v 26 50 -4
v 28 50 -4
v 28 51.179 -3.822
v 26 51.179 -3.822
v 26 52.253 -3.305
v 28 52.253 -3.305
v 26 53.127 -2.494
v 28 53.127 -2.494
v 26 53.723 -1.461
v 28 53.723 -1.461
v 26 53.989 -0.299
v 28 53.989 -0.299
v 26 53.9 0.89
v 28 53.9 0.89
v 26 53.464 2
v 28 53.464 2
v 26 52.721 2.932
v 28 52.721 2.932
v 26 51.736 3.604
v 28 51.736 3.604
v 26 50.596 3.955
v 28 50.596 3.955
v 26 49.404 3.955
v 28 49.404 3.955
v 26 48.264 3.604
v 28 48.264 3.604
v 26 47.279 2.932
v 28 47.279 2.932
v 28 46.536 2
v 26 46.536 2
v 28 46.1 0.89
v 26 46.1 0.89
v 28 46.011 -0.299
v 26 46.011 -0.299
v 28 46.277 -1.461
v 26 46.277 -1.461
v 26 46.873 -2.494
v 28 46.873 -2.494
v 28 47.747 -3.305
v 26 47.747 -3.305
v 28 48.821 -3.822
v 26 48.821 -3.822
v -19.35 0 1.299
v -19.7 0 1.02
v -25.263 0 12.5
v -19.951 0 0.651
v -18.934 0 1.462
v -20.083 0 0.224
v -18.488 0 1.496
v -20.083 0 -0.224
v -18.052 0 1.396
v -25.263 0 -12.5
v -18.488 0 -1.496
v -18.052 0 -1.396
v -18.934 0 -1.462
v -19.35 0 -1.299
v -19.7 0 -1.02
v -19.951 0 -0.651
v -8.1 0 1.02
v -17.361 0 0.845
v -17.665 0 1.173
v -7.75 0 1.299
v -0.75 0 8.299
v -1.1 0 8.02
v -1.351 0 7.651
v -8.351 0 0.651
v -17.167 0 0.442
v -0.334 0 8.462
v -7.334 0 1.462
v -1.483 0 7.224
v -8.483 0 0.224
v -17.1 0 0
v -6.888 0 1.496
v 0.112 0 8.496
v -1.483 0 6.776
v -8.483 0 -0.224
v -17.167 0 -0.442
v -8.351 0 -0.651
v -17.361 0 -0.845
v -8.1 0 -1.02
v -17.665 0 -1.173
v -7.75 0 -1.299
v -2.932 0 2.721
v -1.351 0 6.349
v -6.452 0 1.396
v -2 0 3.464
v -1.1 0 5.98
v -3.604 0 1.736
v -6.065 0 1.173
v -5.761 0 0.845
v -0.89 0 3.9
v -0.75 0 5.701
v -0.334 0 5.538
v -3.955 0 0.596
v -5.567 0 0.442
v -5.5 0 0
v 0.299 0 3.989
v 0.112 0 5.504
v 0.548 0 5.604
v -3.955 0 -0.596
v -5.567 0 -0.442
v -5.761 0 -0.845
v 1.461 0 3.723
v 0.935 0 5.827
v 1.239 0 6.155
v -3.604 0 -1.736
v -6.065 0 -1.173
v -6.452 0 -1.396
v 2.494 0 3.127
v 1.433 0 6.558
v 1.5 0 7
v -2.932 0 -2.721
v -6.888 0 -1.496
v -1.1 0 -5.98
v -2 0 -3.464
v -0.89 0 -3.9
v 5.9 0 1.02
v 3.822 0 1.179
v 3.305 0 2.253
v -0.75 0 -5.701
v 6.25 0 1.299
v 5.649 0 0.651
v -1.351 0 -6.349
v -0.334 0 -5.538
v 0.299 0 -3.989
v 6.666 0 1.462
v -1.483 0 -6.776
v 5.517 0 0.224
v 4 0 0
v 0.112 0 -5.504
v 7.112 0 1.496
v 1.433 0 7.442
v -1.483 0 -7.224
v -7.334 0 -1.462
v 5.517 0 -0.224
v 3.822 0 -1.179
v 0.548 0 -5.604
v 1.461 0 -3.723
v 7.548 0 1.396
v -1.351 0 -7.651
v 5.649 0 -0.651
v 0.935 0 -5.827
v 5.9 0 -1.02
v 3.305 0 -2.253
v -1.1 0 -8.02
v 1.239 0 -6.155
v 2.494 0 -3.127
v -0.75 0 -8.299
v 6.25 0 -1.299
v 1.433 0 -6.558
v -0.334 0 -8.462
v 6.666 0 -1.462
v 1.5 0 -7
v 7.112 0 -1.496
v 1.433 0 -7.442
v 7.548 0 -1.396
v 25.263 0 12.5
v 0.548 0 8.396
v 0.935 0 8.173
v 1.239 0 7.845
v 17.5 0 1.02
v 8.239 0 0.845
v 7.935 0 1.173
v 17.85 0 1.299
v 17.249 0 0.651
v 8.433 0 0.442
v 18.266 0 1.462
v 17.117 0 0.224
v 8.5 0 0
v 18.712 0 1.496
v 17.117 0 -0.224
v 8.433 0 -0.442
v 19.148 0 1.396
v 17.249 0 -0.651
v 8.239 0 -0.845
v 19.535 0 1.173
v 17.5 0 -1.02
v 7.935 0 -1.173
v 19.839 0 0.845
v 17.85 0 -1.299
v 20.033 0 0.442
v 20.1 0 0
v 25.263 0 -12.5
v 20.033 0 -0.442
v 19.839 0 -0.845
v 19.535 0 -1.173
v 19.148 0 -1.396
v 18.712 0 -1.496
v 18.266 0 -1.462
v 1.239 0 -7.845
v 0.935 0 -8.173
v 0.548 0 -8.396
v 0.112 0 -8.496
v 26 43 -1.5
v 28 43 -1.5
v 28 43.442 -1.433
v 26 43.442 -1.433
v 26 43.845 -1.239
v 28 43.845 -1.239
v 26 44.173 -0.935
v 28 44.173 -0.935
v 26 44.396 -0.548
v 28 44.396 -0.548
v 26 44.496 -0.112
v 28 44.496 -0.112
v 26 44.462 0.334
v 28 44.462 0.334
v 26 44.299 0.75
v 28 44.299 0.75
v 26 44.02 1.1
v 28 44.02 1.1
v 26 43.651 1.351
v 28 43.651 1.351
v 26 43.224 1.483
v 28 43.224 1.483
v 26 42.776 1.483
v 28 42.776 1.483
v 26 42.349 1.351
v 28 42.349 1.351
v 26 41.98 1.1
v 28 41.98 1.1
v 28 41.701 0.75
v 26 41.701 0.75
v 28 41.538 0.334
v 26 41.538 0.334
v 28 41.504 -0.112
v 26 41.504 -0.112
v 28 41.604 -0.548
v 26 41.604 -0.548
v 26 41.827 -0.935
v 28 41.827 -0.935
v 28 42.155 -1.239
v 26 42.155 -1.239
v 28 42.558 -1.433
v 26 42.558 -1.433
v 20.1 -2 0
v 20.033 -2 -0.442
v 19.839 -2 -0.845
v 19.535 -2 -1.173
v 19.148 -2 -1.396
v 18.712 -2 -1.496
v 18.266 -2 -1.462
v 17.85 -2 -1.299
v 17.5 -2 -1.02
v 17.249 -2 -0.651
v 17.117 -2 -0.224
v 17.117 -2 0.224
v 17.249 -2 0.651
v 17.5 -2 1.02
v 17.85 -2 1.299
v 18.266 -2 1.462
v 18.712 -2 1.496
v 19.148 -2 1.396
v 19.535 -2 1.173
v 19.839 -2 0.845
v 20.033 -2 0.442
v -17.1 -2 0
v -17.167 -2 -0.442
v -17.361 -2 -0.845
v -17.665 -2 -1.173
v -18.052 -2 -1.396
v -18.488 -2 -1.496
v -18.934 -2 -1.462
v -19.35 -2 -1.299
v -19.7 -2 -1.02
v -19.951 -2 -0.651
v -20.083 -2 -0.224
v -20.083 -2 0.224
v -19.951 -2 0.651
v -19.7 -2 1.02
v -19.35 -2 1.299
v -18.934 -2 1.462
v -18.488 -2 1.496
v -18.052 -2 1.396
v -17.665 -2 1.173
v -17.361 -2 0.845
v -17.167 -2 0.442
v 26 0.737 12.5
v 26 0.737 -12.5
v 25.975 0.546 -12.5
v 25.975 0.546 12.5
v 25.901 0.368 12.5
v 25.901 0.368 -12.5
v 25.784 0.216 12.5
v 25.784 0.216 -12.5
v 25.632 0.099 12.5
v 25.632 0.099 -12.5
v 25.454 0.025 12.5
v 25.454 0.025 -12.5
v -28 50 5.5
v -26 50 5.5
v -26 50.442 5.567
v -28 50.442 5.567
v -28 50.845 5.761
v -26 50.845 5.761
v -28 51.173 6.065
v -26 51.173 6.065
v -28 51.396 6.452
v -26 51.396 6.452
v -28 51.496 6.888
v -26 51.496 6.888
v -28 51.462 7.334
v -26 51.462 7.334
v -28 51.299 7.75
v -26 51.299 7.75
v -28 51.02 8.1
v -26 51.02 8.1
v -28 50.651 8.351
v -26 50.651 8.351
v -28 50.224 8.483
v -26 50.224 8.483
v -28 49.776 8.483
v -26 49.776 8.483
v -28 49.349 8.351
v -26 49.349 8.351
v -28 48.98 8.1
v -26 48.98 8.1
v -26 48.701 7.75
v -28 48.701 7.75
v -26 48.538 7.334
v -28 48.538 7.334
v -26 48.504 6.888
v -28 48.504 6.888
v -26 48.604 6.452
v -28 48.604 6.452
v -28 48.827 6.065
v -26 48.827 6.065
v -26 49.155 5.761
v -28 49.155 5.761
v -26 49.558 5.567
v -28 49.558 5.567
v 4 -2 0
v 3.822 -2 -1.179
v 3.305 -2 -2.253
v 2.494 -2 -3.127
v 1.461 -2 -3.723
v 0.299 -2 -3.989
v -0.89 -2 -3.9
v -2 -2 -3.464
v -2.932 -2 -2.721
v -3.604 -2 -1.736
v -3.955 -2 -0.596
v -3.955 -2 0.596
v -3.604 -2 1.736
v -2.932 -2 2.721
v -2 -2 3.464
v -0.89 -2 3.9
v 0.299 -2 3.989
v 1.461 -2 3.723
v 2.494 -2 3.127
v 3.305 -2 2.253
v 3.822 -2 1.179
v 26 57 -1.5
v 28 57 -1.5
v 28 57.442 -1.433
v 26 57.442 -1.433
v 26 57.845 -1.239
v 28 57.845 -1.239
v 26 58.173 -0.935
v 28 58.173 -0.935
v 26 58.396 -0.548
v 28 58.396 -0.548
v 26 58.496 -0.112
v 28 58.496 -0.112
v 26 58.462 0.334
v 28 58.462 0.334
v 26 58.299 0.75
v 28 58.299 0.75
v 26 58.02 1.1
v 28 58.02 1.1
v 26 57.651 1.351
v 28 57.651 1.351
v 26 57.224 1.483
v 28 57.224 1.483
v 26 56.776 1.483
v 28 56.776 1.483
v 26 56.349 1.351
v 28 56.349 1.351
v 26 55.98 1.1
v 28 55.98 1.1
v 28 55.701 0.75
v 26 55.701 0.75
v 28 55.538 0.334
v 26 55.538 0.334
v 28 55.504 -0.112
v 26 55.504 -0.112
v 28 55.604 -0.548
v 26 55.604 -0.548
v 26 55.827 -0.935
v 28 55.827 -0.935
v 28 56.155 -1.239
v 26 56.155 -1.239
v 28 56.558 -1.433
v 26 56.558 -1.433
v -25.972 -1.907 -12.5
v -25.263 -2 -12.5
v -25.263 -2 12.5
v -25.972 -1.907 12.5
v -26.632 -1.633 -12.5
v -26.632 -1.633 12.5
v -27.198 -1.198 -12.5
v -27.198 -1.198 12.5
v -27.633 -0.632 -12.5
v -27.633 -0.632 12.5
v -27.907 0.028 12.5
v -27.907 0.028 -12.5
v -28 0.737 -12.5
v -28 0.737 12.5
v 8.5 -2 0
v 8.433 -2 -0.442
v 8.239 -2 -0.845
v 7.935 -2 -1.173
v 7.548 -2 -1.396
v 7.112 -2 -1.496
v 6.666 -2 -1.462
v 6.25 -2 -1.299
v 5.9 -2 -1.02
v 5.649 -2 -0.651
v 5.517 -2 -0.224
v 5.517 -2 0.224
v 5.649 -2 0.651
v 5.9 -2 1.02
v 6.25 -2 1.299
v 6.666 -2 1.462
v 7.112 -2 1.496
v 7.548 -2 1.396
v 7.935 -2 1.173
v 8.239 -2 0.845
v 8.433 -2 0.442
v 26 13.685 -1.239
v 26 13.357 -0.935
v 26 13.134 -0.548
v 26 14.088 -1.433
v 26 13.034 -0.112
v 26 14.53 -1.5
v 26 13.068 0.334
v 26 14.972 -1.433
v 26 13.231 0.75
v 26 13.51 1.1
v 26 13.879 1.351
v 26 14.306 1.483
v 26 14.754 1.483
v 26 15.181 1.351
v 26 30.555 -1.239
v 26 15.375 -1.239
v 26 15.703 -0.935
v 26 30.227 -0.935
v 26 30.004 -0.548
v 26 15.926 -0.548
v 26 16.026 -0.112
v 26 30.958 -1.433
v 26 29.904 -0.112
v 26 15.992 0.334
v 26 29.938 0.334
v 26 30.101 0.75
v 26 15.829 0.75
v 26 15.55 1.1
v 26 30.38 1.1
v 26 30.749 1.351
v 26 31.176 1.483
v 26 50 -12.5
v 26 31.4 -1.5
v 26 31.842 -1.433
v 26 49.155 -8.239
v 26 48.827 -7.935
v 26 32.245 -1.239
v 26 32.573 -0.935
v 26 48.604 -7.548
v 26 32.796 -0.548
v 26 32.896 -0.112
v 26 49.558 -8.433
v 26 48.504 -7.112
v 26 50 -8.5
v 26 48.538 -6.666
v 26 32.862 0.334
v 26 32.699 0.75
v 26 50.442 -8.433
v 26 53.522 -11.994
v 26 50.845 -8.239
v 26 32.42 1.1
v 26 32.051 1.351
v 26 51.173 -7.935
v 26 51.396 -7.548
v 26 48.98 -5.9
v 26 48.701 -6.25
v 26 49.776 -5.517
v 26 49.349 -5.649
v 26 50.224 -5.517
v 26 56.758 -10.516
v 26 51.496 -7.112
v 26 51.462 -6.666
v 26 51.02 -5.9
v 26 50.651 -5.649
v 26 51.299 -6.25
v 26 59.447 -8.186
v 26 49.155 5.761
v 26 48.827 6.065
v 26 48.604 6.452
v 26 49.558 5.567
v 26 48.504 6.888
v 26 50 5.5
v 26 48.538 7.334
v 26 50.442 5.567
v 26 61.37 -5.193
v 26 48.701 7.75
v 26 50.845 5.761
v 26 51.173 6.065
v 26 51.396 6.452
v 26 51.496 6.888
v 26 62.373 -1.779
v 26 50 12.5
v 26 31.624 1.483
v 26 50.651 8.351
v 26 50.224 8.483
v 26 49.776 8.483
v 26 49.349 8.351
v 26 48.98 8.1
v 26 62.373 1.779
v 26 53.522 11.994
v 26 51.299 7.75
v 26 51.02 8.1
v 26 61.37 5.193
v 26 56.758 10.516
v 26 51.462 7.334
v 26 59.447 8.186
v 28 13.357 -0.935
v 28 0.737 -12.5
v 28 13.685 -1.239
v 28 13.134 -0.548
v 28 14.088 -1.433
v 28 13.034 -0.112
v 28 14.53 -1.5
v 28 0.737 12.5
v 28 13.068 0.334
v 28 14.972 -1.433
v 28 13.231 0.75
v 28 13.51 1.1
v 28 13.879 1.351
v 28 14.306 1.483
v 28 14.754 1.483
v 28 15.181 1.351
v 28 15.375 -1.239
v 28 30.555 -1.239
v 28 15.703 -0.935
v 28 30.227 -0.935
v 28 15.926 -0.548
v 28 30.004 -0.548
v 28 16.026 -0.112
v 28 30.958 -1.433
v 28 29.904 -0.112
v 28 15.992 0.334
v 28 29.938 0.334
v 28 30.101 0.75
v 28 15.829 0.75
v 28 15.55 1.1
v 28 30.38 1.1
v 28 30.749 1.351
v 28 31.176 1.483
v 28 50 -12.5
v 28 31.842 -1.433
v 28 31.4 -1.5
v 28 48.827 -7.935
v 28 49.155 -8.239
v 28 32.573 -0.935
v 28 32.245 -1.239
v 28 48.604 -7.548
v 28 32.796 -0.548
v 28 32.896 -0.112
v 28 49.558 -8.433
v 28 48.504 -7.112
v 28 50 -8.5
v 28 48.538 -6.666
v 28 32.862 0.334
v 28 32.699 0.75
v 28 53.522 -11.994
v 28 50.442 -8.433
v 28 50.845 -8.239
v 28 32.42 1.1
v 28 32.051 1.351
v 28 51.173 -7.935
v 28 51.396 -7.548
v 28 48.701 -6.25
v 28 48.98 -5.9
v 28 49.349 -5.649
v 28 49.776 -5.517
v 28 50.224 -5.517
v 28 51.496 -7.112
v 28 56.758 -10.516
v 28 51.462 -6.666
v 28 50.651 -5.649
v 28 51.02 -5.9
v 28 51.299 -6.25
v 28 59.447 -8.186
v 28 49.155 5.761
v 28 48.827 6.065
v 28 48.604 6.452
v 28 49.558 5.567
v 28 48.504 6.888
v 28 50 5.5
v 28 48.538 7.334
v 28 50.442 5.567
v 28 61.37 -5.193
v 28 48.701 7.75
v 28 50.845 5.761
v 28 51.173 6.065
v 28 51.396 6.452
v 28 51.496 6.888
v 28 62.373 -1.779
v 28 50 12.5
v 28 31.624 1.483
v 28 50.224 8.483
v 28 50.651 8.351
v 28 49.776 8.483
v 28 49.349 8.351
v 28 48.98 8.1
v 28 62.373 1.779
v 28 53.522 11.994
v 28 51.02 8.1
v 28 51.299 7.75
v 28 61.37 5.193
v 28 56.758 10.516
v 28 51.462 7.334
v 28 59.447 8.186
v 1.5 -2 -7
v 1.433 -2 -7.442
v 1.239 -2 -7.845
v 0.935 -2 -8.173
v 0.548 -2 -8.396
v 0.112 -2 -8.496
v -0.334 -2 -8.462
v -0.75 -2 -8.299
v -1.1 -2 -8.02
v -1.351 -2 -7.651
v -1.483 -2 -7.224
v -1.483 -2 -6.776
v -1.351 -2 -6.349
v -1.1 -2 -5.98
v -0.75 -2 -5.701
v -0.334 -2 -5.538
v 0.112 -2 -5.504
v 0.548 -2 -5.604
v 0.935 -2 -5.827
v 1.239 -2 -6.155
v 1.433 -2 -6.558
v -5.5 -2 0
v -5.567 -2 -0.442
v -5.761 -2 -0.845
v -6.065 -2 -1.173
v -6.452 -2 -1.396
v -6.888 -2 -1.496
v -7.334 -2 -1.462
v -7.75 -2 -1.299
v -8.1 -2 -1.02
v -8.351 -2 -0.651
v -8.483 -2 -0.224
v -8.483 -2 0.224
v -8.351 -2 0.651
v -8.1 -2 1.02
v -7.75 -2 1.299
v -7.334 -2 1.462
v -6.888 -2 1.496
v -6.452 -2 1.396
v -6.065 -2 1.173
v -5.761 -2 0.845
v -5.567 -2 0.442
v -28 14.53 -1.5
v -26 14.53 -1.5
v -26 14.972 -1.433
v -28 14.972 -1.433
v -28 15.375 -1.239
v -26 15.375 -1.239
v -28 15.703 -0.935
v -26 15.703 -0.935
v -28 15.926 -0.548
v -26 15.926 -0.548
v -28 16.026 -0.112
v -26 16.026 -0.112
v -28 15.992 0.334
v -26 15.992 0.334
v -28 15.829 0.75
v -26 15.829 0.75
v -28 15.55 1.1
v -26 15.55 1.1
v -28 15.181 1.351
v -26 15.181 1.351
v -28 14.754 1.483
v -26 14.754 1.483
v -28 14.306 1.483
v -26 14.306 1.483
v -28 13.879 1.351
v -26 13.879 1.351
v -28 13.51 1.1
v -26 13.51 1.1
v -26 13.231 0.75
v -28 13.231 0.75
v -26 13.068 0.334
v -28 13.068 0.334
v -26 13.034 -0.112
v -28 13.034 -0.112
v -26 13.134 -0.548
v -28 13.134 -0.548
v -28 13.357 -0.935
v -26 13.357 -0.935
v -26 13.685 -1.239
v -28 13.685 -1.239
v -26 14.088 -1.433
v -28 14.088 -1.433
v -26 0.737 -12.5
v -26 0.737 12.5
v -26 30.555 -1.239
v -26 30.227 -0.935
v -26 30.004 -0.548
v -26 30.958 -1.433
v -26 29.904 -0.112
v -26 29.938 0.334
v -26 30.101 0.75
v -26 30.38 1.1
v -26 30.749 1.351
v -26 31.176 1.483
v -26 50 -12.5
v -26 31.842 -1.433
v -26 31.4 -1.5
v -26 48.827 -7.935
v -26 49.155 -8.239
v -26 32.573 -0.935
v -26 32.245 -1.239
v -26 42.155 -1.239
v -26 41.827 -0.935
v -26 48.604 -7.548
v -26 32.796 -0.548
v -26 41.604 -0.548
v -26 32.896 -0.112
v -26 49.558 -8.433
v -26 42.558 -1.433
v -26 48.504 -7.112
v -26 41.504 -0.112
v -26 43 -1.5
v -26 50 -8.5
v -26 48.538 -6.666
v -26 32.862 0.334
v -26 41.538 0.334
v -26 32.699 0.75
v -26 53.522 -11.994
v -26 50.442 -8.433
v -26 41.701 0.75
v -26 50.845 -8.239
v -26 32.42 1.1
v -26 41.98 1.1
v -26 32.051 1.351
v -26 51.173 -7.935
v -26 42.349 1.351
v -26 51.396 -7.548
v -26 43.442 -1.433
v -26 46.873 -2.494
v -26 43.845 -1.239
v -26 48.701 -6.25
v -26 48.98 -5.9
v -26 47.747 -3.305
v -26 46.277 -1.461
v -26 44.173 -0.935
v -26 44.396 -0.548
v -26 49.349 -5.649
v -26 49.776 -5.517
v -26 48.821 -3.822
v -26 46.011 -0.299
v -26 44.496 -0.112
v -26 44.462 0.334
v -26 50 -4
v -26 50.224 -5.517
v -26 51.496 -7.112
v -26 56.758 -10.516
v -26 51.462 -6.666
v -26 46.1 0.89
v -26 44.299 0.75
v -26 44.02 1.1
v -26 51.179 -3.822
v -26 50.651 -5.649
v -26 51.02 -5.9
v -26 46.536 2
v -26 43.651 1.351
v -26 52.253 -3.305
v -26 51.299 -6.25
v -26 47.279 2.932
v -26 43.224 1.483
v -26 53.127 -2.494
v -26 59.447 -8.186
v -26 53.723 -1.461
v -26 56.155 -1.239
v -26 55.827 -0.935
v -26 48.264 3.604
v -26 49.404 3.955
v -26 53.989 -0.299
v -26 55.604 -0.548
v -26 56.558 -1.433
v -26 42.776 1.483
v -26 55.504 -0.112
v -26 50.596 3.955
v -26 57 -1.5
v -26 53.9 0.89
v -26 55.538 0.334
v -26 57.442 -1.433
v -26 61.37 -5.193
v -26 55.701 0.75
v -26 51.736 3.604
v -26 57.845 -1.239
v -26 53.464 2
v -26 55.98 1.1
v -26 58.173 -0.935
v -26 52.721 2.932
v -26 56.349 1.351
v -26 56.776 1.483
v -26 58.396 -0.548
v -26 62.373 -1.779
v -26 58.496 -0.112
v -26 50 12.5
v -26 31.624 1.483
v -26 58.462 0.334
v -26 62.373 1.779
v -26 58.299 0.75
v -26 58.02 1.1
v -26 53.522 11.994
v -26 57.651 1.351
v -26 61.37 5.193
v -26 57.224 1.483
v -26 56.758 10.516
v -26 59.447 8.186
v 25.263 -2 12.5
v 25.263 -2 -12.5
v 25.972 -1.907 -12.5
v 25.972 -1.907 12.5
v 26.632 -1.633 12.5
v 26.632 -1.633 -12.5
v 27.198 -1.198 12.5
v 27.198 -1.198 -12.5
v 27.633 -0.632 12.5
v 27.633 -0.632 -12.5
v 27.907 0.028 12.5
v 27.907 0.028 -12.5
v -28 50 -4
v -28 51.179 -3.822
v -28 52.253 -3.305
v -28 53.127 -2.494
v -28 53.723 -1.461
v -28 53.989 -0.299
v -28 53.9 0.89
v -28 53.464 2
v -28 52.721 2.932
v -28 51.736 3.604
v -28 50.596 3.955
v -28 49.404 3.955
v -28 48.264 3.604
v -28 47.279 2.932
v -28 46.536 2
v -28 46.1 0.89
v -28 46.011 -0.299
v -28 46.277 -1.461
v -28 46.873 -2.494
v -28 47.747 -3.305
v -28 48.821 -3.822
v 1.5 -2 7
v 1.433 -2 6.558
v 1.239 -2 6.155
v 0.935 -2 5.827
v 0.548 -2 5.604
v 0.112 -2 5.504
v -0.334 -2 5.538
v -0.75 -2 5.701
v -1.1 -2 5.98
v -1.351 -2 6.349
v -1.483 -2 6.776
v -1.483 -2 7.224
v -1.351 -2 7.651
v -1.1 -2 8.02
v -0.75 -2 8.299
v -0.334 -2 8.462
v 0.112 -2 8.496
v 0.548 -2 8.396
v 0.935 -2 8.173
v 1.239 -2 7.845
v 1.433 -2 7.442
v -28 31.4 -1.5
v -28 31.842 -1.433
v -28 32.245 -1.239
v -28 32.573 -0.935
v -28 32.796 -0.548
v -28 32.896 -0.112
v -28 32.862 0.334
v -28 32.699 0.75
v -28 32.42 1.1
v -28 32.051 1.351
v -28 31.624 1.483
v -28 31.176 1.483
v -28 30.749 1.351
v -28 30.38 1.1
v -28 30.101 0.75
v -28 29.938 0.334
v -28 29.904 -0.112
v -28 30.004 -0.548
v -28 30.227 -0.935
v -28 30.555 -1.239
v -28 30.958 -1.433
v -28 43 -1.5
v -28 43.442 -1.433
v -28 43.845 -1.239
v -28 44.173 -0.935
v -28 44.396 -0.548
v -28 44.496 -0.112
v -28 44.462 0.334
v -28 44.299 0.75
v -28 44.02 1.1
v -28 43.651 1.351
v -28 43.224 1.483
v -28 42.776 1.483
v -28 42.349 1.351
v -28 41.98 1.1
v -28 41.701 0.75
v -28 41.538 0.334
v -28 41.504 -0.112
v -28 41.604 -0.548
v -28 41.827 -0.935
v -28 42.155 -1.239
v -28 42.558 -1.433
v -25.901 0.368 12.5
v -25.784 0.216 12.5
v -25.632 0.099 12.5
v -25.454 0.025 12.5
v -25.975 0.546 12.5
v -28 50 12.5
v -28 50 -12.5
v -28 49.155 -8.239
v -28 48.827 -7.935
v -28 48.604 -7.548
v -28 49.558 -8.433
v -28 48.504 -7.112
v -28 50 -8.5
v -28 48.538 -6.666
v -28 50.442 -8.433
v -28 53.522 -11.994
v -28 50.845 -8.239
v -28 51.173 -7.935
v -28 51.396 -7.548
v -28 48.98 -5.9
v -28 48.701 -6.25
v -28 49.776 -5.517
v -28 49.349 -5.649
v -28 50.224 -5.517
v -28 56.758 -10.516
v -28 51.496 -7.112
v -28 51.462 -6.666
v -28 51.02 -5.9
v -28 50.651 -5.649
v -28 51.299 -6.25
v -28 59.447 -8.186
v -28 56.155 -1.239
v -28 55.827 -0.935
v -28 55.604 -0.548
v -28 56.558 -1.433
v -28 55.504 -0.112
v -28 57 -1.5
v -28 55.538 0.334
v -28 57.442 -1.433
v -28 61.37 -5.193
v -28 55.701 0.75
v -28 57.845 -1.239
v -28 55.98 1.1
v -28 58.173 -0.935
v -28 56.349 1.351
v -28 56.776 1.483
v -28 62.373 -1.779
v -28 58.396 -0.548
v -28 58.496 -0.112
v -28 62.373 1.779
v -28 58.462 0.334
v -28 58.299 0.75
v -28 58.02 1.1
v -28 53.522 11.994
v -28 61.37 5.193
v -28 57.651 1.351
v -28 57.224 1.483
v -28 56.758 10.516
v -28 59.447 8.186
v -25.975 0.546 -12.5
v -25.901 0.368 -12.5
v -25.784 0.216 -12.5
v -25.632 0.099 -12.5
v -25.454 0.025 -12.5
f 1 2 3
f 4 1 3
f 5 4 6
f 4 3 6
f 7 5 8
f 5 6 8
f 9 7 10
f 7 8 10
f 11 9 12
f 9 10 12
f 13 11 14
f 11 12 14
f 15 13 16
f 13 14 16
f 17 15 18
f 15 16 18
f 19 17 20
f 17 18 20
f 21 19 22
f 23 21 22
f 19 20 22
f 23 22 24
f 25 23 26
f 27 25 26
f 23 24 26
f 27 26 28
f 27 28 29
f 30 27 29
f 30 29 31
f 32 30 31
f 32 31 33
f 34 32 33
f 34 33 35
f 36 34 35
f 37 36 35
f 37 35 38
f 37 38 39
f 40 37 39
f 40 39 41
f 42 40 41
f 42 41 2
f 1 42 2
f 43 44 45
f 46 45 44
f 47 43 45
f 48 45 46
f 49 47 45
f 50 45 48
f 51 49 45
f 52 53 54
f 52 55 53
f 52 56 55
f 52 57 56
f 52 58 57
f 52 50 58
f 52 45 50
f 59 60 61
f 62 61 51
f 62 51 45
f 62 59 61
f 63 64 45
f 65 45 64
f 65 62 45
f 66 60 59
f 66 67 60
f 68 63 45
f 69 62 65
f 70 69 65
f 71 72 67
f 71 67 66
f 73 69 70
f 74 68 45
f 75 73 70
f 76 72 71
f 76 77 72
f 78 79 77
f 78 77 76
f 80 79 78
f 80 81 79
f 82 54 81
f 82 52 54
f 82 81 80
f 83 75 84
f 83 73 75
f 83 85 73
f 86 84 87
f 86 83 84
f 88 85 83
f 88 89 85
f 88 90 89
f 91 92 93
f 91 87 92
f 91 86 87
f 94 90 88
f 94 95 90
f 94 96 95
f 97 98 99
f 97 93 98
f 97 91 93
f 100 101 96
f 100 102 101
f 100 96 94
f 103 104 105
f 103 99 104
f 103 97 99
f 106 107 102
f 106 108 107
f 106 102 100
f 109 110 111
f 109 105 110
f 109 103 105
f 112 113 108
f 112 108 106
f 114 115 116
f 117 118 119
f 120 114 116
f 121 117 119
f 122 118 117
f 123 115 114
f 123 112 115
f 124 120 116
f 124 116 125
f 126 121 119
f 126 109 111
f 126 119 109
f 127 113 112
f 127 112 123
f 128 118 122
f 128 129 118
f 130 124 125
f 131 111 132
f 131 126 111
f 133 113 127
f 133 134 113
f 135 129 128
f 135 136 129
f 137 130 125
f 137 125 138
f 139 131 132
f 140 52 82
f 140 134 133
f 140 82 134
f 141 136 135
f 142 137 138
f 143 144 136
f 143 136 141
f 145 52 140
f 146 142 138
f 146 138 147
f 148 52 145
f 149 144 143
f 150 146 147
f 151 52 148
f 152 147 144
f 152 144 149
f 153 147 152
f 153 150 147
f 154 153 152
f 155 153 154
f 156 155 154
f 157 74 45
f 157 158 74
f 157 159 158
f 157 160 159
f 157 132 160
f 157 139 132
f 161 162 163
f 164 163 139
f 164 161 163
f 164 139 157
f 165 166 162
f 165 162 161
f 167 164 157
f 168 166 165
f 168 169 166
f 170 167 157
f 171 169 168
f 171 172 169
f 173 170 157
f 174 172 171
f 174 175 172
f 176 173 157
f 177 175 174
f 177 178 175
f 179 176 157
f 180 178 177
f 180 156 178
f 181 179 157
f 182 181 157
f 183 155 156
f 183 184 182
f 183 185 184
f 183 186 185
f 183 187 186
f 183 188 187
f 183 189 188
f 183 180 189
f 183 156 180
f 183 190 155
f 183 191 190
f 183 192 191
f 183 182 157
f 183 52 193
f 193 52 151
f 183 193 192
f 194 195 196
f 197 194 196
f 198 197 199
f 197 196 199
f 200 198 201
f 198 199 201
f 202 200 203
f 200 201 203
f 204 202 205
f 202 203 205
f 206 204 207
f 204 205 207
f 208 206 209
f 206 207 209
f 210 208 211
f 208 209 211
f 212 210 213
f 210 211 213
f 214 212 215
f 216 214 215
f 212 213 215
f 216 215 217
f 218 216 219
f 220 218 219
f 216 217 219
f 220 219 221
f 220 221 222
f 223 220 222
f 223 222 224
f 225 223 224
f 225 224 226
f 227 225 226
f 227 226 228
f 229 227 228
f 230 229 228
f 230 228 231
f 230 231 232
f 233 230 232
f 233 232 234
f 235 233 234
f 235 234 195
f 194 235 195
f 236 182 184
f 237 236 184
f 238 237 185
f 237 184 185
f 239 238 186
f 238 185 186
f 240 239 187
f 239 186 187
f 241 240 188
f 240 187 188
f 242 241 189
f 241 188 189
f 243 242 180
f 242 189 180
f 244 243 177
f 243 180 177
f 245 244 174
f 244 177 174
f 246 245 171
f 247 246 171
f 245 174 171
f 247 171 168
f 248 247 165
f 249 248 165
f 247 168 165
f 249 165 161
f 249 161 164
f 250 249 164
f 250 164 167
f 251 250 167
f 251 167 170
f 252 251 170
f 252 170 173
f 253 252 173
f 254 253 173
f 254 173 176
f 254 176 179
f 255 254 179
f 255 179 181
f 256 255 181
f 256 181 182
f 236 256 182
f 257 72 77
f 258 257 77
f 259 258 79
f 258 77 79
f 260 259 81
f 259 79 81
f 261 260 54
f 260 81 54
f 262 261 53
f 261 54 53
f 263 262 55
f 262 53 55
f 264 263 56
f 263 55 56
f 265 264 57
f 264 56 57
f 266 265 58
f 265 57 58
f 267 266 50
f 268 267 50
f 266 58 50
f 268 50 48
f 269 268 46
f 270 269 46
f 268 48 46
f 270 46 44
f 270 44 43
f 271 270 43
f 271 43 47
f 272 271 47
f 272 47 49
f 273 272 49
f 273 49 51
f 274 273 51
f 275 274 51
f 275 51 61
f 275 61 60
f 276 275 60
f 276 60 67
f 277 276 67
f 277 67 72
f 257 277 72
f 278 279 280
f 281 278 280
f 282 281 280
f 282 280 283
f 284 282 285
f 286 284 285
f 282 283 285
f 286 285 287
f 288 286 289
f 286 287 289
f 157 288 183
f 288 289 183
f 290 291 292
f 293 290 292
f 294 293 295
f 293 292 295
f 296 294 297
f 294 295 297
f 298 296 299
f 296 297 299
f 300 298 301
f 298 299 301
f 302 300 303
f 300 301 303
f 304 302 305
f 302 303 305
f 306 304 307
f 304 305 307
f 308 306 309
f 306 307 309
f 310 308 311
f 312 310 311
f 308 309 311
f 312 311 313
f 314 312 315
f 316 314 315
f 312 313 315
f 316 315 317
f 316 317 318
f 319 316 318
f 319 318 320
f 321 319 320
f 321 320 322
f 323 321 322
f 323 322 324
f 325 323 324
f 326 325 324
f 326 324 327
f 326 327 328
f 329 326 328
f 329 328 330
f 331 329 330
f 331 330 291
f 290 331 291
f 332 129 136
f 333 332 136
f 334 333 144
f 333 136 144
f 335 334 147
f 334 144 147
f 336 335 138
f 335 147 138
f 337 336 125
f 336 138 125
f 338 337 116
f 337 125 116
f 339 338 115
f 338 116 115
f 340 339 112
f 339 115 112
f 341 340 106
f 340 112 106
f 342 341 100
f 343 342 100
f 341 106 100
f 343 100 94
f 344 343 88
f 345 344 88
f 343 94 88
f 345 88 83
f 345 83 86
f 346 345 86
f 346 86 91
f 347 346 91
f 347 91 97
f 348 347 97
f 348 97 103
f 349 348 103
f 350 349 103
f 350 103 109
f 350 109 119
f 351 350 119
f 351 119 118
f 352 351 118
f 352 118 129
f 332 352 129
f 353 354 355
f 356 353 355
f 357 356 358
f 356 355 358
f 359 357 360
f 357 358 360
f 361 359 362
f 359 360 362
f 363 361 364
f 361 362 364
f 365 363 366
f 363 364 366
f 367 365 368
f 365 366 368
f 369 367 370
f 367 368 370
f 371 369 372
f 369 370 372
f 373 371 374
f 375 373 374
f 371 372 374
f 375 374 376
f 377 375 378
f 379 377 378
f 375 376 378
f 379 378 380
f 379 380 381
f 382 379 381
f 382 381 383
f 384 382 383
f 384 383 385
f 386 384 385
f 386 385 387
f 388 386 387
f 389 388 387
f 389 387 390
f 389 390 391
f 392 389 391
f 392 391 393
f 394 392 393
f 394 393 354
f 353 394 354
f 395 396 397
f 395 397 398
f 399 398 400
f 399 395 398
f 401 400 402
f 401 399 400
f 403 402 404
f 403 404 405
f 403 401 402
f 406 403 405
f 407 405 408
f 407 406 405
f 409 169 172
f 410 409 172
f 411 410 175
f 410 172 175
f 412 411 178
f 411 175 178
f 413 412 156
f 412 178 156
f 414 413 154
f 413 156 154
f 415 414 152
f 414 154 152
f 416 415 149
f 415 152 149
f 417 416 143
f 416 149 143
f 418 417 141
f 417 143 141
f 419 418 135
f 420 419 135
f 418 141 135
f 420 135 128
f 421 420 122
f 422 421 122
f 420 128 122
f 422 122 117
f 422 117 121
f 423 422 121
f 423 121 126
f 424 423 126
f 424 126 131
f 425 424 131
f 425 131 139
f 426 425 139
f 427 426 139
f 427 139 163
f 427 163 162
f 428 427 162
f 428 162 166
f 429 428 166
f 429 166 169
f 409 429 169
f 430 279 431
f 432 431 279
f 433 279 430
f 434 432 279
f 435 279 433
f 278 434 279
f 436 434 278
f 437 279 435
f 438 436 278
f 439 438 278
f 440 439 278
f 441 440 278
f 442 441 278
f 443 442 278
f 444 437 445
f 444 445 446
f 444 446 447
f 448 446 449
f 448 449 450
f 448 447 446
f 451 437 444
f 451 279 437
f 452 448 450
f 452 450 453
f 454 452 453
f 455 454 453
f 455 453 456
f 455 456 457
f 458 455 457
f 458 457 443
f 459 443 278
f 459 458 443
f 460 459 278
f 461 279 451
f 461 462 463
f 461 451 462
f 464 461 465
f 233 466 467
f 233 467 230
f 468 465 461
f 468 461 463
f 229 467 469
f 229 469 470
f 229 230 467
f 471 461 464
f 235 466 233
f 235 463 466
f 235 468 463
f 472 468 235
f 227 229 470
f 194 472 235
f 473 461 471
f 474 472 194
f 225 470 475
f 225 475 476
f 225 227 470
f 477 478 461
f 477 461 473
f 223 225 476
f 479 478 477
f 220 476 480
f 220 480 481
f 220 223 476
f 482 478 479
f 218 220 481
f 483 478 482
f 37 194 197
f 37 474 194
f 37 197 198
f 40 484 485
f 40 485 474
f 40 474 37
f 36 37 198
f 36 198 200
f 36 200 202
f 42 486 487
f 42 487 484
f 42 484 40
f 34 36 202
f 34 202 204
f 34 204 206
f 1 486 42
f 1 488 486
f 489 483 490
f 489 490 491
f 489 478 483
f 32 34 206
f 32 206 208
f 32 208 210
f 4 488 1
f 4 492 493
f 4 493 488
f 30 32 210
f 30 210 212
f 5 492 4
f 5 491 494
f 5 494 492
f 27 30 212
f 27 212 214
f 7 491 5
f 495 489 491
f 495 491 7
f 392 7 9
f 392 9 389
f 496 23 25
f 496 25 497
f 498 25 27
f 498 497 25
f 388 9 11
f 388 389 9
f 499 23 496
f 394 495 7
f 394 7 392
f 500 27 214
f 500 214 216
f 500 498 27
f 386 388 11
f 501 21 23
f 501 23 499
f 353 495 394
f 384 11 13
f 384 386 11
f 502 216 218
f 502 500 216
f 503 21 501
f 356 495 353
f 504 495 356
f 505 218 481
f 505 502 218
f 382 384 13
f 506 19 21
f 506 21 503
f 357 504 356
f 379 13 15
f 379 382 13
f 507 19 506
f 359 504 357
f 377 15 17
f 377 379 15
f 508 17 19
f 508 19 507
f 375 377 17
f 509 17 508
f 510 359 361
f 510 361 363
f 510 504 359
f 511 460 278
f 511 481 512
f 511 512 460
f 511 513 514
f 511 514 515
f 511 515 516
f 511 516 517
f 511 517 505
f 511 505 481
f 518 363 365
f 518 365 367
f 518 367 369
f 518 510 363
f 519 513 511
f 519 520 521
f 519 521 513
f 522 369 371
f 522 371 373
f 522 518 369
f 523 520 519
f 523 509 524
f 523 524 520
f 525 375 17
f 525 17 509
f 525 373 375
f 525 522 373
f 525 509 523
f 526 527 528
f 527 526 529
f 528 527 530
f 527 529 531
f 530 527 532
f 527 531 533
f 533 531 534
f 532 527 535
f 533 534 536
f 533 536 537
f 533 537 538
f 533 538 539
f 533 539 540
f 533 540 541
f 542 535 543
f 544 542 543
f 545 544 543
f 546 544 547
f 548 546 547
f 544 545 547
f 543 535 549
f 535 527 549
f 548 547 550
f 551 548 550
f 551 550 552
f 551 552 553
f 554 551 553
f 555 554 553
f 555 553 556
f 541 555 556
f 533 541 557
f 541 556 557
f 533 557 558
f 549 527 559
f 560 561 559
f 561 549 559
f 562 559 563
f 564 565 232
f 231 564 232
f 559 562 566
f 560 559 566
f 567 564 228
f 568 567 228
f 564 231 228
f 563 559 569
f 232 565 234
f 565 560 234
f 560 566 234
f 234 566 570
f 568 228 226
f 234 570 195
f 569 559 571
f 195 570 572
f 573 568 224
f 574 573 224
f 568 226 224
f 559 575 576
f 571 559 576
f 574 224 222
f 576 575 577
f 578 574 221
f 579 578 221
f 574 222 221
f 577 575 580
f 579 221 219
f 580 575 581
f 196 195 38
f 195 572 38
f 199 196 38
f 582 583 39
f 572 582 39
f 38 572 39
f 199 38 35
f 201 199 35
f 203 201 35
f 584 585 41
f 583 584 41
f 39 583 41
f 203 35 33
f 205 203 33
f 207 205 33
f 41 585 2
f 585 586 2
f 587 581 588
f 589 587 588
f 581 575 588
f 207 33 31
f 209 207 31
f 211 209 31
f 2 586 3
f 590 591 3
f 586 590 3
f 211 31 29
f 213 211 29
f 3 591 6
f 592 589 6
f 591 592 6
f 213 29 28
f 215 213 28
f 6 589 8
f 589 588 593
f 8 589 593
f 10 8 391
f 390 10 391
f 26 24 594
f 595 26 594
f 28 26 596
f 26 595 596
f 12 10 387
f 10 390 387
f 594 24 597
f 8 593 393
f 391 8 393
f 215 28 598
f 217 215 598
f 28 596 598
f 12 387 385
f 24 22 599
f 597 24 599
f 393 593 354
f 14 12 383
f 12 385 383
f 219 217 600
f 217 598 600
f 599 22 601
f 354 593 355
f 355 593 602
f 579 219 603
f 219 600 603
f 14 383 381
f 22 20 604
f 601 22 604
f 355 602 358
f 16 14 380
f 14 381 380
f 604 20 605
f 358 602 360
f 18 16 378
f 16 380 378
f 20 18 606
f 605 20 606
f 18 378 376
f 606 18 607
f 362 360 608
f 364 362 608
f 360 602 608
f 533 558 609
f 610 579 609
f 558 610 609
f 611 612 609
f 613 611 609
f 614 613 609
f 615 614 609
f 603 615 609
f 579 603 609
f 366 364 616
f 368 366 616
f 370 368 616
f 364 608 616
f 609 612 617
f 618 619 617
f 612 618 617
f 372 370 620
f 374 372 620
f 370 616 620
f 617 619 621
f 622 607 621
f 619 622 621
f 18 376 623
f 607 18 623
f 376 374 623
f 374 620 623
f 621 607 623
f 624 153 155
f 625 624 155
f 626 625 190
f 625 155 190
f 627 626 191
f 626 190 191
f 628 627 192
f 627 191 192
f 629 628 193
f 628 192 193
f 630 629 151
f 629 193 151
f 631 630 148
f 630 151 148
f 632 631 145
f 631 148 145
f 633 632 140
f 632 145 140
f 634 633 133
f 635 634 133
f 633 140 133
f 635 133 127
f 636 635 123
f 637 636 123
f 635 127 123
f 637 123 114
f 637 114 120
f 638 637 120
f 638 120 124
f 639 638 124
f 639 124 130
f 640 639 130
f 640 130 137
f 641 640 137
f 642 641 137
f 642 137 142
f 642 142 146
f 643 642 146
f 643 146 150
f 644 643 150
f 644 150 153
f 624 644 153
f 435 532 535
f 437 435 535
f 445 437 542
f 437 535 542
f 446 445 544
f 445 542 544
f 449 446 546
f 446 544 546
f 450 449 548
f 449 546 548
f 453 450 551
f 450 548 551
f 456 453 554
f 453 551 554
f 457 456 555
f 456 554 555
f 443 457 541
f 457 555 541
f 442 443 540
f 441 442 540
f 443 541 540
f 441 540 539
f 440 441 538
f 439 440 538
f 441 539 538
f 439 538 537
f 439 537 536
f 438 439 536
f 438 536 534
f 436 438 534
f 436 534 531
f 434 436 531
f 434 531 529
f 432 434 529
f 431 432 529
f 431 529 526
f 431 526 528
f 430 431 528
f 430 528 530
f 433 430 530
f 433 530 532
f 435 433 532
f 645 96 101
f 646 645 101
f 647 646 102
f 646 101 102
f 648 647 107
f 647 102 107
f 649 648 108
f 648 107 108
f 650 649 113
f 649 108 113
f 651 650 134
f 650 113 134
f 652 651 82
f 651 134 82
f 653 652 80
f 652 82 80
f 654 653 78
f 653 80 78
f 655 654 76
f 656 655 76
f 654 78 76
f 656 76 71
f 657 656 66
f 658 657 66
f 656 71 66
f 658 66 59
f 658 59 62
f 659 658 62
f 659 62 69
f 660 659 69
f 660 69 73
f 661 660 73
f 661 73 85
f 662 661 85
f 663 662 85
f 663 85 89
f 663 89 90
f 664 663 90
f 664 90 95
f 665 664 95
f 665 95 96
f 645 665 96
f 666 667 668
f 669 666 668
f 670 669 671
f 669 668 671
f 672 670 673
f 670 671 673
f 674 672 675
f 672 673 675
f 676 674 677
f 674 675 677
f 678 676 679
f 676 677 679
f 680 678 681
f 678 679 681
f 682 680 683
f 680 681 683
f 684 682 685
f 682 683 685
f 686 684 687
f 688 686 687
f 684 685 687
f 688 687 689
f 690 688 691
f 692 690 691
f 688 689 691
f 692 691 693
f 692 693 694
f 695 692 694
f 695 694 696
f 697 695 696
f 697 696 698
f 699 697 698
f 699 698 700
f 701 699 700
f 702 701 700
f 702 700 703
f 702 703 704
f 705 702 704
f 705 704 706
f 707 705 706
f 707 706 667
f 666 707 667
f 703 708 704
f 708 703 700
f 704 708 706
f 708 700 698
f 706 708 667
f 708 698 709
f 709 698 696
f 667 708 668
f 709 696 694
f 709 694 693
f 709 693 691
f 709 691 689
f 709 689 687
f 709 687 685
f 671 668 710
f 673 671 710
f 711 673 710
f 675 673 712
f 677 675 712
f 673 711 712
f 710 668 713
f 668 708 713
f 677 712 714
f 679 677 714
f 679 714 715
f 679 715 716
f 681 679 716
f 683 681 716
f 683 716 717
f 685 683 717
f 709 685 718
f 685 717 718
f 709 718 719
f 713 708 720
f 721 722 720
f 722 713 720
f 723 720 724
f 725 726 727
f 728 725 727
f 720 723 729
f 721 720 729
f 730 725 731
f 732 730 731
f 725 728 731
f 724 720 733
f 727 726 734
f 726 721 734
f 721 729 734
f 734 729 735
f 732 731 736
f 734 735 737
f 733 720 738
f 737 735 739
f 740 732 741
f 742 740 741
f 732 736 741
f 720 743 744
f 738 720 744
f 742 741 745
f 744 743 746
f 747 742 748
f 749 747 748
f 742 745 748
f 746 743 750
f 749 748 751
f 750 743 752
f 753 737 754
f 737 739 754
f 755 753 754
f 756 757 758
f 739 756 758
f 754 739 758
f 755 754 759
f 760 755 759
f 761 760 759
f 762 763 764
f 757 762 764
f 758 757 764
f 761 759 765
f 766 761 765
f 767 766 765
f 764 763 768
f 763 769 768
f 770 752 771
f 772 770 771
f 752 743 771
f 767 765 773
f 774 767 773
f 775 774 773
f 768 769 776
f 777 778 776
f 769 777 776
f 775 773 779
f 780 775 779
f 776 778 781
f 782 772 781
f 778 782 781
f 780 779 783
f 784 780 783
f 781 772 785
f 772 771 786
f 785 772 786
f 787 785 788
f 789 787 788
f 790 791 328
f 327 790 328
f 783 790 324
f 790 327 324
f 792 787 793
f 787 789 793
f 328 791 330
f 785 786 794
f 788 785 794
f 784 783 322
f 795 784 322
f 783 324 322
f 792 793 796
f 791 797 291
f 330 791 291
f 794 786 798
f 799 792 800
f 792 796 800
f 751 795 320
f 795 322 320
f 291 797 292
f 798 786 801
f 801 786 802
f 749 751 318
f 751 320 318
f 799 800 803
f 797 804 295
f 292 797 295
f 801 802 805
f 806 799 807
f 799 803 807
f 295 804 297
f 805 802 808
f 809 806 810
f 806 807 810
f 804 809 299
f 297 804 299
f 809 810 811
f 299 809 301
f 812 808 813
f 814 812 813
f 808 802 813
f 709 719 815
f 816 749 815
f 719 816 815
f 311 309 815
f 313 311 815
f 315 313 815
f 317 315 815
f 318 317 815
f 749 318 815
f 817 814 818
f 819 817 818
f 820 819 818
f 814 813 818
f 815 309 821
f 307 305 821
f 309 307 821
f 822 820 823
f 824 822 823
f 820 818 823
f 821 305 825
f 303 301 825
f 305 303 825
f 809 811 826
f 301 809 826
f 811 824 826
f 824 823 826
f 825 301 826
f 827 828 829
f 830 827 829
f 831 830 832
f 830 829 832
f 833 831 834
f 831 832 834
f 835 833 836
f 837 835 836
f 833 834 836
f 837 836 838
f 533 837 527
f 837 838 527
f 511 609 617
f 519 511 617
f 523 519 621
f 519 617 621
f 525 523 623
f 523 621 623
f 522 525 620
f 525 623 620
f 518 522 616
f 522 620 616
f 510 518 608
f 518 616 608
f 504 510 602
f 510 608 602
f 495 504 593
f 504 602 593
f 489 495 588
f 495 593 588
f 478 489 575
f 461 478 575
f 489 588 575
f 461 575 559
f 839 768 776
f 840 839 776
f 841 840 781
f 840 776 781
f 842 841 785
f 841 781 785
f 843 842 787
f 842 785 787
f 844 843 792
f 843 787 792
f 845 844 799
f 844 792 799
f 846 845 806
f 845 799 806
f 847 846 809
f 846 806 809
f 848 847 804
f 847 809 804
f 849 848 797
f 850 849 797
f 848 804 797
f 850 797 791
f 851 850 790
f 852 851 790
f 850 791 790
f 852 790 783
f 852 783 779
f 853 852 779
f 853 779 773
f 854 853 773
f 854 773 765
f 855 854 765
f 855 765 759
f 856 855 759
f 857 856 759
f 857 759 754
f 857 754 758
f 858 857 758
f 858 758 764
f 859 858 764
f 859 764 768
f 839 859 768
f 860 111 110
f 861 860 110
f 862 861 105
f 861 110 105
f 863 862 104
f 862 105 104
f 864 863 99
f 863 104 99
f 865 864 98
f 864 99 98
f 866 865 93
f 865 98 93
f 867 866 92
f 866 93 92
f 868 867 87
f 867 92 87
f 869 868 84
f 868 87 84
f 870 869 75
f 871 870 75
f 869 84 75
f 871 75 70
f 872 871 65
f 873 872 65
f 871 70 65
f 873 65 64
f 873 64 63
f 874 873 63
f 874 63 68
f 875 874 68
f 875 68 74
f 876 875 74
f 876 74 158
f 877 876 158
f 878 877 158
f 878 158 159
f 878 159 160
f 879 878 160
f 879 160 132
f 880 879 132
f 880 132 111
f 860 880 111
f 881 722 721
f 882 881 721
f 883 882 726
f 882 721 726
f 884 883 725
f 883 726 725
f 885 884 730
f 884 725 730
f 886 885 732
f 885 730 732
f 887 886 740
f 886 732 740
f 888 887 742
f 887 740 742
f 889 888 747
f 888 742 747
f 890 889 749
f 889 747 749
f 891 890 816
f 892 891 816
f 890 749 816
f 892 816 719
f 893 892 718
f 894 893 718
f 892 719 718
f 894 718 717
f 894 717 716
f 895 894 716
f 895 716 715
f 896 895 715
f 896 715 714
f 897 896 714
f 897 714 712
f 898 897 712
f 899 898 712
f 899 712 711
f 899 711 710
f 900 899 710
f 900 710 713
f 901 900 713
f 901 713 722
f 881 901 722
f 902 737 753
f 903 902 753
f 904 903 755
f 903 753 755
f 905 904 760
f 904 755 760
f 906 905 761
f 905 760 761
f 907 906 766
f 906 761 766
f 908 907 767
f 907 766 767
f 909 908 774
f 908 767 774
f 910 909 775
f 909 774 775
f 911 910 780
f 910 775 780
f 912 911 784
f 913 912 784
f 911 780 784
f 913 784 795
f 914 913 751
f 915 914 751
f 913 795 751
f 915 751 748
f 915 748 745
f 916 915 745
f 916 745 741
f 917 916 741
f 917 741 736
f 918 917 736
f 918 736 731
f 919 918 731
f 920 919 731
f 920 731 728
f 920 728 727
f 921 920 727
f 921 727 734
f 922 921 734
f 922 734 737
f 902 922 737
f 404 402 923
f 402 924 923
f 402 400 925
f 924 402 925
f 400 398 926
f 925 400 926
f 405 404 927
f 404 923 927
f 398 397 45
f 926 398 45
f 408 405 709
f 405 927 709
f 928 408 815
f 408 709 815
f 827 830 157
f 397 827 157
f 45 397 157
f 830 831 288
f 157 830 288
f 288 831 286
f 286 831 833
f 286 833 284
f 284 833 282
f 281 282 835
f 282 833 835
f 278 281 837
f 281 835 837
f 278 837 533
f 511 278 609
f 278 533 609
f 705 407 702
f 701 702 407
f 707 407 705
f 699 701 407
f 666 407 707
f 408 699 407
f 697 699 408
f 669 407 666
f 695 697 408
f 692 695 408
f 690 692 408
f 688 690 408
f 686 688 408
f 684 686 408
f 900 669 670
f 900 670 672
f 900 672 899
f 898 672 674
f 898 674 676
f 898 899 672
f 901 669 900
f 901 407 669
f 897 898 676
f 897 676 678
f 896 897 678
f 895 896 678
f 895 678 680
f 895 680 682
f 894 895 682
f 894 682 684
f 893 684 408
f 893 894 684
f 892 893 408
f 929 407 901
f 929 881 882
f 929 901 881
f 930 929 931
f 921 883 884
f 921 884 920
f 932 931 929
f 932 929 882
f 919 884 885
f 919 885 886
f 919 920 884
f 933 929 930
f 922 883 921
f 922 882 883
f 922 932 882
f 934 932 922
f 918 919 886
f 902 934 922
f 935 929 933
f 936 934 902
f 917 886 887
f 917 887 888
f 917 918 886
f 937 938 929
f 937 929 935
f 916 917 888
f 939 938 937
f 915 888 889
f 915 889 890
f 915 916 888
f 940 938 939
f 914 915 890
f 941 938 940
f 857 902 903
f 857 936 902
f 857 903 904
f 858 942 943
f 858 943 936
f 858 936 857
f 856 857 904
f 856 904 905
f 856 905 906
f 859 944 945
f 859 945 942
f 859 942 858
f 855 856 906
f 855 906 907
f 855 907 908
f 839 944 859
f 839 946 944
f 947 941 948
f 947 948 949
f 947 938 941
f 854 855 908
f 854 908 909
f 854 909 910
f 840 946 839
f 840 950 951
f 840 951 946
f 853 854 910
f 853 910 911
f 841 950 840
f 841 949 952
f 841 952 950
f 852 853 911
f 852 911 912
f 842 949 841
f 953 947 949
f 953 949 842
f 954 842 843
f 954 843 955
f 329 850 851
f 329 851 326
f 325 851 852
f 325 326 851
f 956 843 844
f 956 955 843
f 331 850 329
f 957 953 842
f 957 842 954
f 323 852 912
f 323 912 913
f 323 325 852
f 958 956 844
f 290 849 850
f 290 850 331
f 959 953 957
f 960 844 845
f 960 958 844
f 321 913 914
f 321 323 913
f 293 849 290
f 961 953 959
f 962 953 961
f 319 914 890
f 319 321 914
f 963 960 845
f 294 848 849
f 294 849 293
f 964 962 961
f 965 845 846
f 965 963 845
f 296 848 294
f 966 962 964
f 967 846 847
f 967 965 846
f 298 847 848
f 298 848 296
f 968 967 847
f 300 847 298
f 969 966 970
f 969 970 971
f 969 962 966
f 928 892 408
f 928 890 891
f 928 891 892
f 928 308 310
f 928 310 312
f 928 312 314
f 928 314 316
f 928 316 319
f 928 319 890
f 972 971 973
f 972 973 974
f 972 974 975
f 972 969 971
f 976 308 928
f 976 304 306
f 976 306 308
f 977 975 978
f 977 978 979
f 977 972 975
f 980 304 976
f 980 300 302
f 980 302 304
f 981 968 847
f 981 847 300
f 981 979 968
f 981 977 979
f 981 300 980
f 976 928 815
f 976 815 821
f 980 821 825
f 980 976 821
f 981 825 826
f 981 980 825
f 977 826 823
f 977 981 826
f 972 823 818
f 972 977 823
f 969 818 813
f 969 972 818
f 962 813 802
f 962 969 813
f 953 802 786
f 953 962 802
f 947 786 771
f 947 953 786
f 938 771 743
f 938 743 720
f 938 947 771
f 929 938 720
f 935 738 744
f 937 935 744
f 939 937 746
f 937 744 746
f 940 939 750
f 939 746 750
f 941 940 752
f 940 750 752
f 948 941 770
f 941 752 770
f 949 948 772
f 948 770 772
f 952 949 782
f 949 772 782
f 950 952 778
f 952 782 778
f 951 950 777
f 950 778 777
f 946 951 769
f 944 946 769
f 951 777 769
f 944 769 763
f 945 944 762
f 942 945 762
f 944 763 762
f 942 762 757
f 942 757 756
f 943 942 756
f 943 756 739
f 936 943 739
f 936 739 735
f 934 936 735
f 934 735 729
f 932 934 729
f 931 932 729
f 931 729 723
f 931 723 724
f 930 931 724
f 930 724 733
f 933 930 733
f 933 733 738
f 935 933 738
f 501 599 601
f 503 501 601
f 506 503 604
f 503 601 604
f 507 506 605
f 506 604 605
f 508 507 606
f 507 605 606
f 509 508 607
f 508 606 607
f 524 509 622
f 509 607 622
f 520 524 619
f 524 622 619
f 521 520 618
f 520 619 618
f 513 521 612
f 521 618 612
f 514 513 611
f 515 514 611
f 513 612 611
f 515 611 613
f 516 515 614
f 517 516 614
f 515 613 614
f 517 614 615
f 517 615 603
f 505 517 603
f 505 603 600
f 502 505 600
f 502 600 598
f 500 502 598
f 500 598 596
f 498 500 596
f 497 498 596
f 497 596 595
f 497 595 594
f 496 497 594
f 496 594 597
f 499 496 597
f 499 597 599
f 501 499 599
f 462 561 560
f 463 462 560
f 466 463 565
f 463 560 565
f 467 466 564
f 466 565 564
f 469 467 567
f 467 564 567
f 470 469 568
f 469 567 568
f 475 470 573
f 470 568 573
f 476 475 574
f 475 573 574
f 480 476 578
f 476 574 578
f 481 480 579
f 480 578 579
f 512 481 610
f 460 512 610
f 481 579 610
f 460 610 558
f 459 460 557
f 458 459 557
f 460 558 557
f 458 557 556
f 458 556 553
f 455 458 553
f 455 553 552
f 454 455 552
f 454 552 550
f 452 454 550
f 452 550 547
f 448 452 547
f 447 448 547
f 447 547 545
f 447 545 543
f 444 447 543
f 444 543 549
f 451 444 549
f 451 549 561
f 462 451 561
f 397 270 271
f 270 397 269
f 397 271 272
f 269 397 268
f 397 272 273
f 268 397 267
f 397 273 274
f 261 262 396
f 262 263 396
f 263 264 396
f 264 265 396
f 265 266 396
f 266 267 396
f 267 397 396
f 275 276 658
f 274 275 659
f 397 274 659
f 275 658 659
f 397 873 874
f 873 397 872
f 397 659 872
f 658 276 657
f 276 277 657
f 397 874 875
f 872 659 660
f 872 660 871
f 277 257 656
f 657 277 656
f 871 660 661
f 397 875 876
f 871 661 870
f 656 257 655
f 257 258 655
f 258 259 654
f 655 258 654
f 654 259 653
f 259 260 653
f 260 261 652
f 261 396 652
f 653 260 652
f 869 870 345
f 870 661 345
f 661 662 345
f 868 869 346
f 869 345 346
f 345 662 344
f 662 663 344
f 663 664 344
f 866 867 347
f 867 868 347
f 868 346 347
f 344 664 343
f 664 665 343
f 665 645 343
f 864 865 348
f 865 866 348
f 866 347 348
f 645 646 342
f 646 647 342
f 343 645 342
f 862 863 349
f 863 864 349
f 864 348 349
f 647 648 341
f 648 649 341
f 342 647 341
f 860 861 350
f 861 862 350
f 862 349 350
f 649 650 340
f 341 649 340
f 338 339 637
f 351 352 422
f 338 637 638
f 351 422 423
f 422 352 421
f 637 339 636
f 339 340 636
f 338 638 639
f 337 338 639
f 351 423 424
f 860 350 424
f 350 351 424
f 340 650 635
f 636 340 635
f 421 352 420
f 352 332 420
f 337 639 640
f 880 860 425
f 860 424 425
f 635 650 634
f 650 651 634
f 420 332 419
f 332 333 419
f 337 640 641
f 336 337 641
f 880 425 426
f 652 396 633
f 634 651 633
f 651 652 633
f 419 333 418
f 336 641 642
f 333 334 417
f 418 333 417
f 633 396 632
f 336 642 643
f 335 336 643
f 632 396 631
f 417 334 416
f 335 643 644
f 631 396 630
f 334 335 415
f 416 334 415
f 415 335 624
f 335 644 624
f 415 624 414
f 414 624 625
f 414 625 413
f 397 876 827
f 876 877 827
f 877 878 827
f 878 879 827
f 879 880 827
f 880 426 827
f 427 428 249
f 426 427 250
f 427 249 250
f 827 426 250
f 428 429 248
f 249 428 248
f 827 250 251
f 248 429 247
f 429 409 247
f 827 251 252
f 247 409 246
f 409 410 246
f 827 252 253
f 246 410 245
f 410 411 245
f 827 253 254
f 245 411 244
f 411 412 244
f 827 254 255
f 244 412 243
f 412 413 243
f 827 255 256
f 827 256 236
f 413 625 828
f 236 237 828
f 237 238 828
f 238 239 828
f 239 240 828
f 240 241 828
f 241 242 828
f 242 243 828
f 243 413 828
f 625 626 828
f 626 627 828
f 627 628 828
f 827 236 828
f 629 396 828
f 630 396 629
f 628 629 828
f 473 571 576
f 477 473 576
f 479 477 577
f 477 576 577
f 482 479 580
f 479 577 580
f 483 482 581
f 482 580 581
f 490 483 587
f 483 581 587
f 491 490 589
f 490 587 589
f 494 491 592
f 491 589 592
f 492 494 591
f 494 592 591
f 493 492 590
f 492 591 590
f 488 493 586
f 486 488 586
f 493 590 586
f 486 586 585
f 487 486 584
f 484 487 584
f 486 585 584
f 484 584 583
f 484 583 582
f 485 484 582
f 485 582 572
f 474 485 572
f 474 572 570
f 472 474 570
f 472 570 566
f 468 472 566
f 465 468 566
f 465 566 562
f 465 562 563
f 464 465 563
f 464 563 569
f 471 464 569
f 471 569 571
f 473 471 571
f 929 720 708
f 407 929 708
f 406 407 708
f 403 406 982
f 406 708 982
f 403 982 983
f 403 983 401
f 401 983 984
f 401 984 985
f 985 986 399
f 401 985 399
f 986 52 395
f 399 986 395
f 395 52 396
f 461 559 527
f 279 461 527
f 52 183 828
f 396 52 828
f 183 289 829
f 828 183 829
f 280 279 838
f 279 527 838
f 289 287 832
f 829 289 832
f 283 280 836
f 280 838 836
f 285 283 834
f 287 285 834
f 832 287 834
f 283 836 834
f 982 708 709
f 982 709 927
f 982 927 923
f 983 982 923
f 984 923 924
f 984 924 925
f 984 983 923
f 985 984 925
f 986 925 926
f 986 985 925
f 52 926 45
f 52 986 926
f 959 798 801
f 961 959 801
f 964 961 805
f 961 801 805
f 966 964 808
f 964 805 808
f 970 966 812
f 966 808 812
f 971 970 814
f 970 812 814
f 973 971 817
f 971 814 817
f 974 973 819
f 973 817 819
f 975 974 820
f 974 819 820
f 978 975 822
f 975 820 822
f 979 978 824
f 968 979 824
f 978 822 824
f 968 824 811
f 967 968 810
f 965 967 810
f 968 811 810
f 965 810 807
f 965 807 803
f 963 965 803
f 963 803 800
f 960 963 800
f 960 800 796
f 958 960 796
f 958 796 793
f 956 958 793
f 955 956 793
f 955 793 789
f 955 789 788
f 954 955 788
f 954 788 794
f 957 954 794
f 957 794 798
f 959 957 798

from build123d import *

# Parameters (mm, degrees)
SKETCH_1_W                       = 52
SKETCH_1_H                       = 25
SM_BASE_FLANGE_1_DEPTH           = 2
SM_EDGE_FLANGE_1_STRIP_W         = 9.4732
SM_EDGE_FLANGE_1_STRIP_H         = 2
SM_EDGE_FLANGE_1_STRIP_CUT_DEPTH = 25
SM_EDGE_FLANGE_1_DEPTH           = 25
SM_START                         = 2
SM_EDGE_FLANGE_1_FLAT_DEPTH      = 2
HOLE_WIZARD_3_0_3_1_D            = 3
HOLE_WIZARD_8_0_8_2_D            = 8
HOLE_WIZARD_8_0_8_3_D            = 8
HOLE_WIZARD_3_0_3_2_D            = 3


# Sheet-metal steps are written as plain solids
with BuildPart() as part:
    # Sketch 1 → 基体-法兰1 (new body)
    with BuildSketch(Plane(origin=(0, 0, 0), x_dir=(1, 0, 0), z_dir=(0, 1, 0))):
        Rectangle(SKETCH_1_W, SKETCH_1_H)
    extrude(amount=-SM_BASE_FLANGE_1_DEPTH)

    # 边线-法兰1 strip (across the edge) → 边线-法兰1 strip cut (cut)
    with BuildSketch(Plane(origin=(-26, 0, -12.5), x_dir=(1, 0, 0), z_dir=(0, 0, 1))):
        with Locations((-4, -1)):
            Rectangle(SM_EDGE_FLANGE_1_STRIP_W, SM_EDGE_FLANGE_1_STRIP_H)
    sm_edge_flange_1_strip_cut = extrude(amount=SM_EDGE_FLANGE_1_STRIP_CUT_DEPTH, mode=Mode.SUBTRACT)

    # 边线-法兰1 bend section (across the edge) → 边线-法兰1 (add)
    with BuildSketch(Plane(origin=(-26, 0, -12.5), x_dir=(1, 0, 0), z_dir=(0, 0, 1))):
        with BuildLine():
            Line((-2, 0.7366), (0, 0.7366))
            ThreePointArc((0, 0.7366), (0.215745145, 0.215745145), (0.7366, 0))
            Line((0.7366, 0), (0.7366, -2))
            ThreePointArc((0.7366, -2), (-1.198468417, -1.198468417), (-2, 0.7366))
        make_face()
    sm_edge_flange_1 = extrude(amount=SM_EDGE_FLANGE_1_DEPTH)

    # 边线-法兰1 profile (on flange) → 边线-法兰1 flat (add)
    with BuildSketch(Plane.ZY.offset(26).offset(SM_START)):
        with BuildLine():
            ThreePointArc((12.5, 50), (0, 62.5), (-12.5, 50))
            Line((-12.5, 50), (-12.5, 0.7366))
            Line((-12.5, 0.7366), (12.5, 0.7366))
            Line((12.5, 0.7366), (12.5, 50))
        make_face()
    sm_edge_flange_1_flat = extrude(amount=-SM_EDGE_FLANGE_1_FLAT_DEPTH)

    # 镜向1: 边线-法兰1 strip cut, 边线-法兰1, 边线-法兰1 flat across plane
    add(sm_edge_flange_1_strip_cut.mirror(Plane(origin=(0, 0, 0), x_dir=(0, 0, 1), z_dir=(1, 0, 0))), mode=Mode.SUBTRACT)
    add(sm_edge_flange_1.mirror(Plane(origin=(0, 0, 0), x_dir=(0, 0, 1), z_dir=(1, 0, 0))))
    add(sm_edge_flange_1_flat.mirror(Plane(origin=(0, 0, 0), x_dir=(0, 0, 1), z_dir=(1, 0, 0))))

    # Ø3.0 (3) 直径孔1 (through all)
    with Locations(Plane(origin=(0, -2, 0), x_dir=(-1, 0, 0), z_dir=(0, -1, 0))):
        with Locations((0, 7), (0, -7), (7, 0), (18.6, 0), (-7, 0), (-18.6, 0)):
            Hole(HOLE_WIZARD_3_0_3_1_D / 2)

    # Ø8.0 (8) 直径孔2 (through all)
    with Locations(Plane(origin=(0, -2, 0), x_dir=(-1, 0, 0), z_dir=(0, -1, 0))):
        with Locations((0, 0)):
            Hole(HOLE_WIZARD_8_0_8_2_D / 2)

    # Ø8.0 (8) 直径孔3 (through all)
    with Locations(Plane.ZY.offset(28)):
        with Locations((0, 50)):
            Hole(HOLE_WIZARD_8_0_8_3_D / 2)

    # Ø3.0 (3) 直径孔2 (through all)
    with Locations(Plane.ZY.offset(28)):
        with Locations((-7, 50), (7, 50), (0, 57), (0, 43), (0, 31.4), (0, 14.53)):
            Hole(HOLE_WIZARD_3_0_3_2_D / 2)


solid = part.part
